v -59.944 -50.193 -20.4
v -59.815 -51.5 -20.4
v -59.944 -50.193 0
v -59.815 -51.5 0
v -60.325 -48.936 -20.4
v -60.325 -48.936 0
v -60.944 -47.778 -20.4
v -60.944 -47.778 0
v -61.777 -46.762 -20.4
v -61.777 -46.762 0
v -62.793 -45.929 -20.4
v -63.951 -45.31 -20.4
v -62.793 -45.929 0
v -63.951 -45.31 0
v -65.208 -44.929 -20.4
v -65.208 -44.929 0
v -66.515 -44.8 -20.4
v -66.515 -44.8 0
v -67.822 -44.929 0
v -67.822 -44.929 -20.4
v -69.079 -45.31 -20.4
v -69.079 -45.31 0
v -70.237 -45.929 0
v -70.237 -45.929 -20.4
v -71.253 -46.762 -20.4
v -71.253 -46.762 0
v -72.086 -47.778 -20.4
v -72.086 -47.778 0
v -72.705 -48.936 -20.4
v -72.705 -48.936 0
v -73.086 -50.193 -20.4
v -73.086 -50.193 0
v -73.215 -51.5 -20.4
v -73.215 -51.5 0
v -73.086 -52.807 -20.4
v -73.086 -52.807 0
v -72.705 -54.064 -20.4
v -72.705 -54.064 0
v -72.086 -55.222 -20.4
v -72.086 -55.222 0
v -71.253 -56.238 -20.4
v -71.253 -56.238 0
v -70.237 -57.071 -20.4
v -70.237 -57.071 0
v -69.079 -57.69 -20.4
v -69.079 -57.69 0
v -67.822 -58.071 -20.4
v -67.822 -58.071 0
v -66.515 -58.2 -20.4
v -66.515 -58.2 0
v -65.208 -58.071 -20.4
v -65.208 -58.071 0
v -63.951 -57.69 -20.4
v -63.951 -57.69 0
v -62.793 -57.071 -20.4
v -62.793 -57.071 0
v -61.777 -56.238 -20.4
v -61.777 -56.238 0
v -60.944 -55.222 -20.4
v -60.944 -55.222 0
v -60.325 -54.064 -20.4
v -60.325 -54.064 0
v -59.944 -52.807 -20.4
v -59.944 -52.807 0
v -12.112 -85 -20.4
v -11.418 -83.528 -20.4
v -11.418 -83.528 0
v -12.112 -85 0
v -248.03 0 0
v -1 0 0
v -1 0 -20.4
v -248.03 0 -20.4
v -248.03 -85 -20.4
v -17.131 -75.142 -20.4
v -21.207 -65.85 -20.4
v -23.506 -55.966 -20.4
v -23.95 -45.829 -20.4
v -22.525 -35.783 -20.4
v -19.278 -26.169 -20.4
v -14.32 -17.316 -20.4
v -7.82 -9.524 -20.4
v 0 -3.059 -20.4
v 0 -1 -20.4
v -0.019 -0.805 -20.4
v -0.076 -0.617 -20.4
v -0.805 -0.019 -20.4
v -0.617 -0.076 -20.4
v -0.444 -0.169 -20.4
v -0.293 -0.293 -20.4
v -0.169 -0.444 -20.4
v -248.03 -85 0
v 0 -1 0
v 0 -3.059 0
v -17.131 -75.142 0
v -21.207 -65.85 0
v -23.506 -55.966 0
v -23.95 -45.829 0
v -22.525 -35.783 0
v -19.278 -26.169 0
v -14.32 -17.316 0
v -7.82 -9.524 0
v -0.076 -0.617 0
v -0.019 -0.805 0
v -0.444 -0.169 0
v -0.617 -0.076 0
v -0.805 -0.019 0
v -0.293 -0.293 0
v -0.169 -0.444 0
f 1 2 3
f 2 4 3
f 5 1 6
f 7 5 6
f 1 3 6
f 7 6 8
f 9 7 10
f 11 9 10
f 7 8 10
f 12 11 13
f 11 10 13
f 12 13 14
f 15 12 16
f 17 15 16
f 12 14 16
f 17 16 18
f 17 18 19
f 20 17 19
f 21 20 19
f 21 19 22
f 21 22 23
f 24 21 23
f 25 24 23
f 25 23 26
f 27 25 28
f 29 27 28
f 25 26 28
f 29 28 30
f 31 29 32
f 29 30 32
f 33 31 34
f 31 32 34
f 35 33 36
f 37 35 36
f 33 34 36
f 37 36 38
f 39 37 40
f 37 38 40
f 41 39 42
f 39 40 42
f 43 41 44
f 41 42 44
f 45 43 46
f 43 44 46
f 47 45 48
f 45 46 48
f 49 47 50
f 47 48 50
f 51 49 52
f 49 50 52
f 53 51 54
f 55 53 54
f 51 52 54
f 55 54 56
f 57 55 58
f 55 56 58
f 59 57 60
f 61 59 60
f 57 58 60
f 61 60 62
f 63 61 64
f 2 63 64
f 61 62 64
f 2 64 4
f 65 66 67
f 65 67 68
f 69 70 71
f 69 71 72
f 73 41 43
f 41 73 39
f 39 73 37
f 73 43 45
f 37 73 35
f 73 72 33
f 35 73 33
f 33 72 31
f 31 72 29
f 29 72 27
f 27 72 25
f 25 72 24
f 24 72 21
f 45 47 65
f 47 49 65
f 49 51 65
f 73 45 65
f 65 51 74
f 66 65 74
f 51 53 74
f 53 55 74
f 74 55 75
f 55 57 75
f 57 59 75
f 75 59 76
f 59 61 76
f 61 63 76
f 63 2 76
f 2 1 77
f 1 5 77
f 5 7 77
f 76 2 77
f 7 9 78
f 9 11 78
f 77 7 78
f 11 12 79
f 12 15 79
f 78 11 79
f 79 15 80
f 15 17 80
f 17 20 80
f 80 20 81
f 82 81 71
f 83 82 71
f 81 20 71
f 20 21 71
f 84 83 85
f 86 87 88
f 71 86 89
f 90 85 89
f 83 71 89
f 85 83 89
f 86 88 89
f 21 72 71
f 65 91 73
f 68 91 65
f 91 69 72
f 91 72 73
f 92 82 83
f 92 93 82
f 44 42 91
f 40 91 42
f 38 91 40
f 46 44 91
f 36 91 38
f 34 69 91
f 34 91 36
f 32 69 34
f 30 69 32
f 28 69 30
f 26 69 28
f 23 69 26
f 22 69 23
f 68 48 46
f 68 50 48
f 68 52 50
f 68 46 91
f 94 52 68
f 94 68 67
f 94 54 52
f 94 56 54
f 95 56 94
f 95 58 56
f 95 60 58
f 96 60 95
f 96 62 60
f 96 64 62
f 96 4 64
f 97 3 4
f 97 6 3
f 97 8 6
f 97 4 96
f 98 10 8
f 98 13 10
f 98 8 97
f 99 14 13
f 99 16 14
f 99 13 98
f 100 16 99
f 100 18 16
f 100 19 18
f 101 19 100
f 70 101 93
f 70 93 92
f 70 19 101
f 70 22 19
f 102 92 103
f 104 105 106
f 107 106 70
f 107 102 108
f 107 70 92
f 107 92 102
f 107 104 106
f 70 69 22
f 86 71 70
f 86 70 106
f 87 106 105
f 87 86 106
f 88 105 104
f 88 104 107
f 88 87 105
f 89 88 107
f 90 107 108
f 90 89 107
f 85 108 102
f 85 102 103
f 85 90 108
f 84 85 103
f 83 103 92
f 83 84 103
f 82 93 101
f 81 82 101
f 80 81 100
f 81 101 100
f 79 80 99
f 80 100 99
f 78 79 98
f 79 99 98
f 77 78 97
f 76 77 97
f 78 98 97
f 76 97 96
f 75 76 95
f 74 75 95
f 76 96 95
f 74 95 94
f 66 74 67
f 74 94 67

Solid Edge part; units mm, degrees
sketch "Sketch1" plane through (0, 0, 0) normal (0, 0, 1) x (1, 0, 0)
  line L0 (0, 0) -> (-248.03, 0)
  line L1 (-248.03, 0) -> (-248.03, -85)
  line L2 (-248.03, -85) -> (0, -85)
  line L3 (0, -85) -> (0, 0)
extrude "Protrusion1" add sketch "Sketch1" against normal blind 20.4
sketch "Sketch2" plane through (-124.015, -42.5, 0) normal (0, 0, 1) x (1, 0, 0)
  circle A0 centre (155, -6) radius 55
  circle A1 centre (57.5, -9) radius 6.7
extrude "ExtrudedCutout_1" cut sketch "Sketch2" against normal blind 20.5
chamfer "Chamfer_2" distance 2 angle 45 1 edges at (-10.158, -85, -10.2)
fillet "Round_1" radius 1 1 edges at (0, 0, -10.2)
